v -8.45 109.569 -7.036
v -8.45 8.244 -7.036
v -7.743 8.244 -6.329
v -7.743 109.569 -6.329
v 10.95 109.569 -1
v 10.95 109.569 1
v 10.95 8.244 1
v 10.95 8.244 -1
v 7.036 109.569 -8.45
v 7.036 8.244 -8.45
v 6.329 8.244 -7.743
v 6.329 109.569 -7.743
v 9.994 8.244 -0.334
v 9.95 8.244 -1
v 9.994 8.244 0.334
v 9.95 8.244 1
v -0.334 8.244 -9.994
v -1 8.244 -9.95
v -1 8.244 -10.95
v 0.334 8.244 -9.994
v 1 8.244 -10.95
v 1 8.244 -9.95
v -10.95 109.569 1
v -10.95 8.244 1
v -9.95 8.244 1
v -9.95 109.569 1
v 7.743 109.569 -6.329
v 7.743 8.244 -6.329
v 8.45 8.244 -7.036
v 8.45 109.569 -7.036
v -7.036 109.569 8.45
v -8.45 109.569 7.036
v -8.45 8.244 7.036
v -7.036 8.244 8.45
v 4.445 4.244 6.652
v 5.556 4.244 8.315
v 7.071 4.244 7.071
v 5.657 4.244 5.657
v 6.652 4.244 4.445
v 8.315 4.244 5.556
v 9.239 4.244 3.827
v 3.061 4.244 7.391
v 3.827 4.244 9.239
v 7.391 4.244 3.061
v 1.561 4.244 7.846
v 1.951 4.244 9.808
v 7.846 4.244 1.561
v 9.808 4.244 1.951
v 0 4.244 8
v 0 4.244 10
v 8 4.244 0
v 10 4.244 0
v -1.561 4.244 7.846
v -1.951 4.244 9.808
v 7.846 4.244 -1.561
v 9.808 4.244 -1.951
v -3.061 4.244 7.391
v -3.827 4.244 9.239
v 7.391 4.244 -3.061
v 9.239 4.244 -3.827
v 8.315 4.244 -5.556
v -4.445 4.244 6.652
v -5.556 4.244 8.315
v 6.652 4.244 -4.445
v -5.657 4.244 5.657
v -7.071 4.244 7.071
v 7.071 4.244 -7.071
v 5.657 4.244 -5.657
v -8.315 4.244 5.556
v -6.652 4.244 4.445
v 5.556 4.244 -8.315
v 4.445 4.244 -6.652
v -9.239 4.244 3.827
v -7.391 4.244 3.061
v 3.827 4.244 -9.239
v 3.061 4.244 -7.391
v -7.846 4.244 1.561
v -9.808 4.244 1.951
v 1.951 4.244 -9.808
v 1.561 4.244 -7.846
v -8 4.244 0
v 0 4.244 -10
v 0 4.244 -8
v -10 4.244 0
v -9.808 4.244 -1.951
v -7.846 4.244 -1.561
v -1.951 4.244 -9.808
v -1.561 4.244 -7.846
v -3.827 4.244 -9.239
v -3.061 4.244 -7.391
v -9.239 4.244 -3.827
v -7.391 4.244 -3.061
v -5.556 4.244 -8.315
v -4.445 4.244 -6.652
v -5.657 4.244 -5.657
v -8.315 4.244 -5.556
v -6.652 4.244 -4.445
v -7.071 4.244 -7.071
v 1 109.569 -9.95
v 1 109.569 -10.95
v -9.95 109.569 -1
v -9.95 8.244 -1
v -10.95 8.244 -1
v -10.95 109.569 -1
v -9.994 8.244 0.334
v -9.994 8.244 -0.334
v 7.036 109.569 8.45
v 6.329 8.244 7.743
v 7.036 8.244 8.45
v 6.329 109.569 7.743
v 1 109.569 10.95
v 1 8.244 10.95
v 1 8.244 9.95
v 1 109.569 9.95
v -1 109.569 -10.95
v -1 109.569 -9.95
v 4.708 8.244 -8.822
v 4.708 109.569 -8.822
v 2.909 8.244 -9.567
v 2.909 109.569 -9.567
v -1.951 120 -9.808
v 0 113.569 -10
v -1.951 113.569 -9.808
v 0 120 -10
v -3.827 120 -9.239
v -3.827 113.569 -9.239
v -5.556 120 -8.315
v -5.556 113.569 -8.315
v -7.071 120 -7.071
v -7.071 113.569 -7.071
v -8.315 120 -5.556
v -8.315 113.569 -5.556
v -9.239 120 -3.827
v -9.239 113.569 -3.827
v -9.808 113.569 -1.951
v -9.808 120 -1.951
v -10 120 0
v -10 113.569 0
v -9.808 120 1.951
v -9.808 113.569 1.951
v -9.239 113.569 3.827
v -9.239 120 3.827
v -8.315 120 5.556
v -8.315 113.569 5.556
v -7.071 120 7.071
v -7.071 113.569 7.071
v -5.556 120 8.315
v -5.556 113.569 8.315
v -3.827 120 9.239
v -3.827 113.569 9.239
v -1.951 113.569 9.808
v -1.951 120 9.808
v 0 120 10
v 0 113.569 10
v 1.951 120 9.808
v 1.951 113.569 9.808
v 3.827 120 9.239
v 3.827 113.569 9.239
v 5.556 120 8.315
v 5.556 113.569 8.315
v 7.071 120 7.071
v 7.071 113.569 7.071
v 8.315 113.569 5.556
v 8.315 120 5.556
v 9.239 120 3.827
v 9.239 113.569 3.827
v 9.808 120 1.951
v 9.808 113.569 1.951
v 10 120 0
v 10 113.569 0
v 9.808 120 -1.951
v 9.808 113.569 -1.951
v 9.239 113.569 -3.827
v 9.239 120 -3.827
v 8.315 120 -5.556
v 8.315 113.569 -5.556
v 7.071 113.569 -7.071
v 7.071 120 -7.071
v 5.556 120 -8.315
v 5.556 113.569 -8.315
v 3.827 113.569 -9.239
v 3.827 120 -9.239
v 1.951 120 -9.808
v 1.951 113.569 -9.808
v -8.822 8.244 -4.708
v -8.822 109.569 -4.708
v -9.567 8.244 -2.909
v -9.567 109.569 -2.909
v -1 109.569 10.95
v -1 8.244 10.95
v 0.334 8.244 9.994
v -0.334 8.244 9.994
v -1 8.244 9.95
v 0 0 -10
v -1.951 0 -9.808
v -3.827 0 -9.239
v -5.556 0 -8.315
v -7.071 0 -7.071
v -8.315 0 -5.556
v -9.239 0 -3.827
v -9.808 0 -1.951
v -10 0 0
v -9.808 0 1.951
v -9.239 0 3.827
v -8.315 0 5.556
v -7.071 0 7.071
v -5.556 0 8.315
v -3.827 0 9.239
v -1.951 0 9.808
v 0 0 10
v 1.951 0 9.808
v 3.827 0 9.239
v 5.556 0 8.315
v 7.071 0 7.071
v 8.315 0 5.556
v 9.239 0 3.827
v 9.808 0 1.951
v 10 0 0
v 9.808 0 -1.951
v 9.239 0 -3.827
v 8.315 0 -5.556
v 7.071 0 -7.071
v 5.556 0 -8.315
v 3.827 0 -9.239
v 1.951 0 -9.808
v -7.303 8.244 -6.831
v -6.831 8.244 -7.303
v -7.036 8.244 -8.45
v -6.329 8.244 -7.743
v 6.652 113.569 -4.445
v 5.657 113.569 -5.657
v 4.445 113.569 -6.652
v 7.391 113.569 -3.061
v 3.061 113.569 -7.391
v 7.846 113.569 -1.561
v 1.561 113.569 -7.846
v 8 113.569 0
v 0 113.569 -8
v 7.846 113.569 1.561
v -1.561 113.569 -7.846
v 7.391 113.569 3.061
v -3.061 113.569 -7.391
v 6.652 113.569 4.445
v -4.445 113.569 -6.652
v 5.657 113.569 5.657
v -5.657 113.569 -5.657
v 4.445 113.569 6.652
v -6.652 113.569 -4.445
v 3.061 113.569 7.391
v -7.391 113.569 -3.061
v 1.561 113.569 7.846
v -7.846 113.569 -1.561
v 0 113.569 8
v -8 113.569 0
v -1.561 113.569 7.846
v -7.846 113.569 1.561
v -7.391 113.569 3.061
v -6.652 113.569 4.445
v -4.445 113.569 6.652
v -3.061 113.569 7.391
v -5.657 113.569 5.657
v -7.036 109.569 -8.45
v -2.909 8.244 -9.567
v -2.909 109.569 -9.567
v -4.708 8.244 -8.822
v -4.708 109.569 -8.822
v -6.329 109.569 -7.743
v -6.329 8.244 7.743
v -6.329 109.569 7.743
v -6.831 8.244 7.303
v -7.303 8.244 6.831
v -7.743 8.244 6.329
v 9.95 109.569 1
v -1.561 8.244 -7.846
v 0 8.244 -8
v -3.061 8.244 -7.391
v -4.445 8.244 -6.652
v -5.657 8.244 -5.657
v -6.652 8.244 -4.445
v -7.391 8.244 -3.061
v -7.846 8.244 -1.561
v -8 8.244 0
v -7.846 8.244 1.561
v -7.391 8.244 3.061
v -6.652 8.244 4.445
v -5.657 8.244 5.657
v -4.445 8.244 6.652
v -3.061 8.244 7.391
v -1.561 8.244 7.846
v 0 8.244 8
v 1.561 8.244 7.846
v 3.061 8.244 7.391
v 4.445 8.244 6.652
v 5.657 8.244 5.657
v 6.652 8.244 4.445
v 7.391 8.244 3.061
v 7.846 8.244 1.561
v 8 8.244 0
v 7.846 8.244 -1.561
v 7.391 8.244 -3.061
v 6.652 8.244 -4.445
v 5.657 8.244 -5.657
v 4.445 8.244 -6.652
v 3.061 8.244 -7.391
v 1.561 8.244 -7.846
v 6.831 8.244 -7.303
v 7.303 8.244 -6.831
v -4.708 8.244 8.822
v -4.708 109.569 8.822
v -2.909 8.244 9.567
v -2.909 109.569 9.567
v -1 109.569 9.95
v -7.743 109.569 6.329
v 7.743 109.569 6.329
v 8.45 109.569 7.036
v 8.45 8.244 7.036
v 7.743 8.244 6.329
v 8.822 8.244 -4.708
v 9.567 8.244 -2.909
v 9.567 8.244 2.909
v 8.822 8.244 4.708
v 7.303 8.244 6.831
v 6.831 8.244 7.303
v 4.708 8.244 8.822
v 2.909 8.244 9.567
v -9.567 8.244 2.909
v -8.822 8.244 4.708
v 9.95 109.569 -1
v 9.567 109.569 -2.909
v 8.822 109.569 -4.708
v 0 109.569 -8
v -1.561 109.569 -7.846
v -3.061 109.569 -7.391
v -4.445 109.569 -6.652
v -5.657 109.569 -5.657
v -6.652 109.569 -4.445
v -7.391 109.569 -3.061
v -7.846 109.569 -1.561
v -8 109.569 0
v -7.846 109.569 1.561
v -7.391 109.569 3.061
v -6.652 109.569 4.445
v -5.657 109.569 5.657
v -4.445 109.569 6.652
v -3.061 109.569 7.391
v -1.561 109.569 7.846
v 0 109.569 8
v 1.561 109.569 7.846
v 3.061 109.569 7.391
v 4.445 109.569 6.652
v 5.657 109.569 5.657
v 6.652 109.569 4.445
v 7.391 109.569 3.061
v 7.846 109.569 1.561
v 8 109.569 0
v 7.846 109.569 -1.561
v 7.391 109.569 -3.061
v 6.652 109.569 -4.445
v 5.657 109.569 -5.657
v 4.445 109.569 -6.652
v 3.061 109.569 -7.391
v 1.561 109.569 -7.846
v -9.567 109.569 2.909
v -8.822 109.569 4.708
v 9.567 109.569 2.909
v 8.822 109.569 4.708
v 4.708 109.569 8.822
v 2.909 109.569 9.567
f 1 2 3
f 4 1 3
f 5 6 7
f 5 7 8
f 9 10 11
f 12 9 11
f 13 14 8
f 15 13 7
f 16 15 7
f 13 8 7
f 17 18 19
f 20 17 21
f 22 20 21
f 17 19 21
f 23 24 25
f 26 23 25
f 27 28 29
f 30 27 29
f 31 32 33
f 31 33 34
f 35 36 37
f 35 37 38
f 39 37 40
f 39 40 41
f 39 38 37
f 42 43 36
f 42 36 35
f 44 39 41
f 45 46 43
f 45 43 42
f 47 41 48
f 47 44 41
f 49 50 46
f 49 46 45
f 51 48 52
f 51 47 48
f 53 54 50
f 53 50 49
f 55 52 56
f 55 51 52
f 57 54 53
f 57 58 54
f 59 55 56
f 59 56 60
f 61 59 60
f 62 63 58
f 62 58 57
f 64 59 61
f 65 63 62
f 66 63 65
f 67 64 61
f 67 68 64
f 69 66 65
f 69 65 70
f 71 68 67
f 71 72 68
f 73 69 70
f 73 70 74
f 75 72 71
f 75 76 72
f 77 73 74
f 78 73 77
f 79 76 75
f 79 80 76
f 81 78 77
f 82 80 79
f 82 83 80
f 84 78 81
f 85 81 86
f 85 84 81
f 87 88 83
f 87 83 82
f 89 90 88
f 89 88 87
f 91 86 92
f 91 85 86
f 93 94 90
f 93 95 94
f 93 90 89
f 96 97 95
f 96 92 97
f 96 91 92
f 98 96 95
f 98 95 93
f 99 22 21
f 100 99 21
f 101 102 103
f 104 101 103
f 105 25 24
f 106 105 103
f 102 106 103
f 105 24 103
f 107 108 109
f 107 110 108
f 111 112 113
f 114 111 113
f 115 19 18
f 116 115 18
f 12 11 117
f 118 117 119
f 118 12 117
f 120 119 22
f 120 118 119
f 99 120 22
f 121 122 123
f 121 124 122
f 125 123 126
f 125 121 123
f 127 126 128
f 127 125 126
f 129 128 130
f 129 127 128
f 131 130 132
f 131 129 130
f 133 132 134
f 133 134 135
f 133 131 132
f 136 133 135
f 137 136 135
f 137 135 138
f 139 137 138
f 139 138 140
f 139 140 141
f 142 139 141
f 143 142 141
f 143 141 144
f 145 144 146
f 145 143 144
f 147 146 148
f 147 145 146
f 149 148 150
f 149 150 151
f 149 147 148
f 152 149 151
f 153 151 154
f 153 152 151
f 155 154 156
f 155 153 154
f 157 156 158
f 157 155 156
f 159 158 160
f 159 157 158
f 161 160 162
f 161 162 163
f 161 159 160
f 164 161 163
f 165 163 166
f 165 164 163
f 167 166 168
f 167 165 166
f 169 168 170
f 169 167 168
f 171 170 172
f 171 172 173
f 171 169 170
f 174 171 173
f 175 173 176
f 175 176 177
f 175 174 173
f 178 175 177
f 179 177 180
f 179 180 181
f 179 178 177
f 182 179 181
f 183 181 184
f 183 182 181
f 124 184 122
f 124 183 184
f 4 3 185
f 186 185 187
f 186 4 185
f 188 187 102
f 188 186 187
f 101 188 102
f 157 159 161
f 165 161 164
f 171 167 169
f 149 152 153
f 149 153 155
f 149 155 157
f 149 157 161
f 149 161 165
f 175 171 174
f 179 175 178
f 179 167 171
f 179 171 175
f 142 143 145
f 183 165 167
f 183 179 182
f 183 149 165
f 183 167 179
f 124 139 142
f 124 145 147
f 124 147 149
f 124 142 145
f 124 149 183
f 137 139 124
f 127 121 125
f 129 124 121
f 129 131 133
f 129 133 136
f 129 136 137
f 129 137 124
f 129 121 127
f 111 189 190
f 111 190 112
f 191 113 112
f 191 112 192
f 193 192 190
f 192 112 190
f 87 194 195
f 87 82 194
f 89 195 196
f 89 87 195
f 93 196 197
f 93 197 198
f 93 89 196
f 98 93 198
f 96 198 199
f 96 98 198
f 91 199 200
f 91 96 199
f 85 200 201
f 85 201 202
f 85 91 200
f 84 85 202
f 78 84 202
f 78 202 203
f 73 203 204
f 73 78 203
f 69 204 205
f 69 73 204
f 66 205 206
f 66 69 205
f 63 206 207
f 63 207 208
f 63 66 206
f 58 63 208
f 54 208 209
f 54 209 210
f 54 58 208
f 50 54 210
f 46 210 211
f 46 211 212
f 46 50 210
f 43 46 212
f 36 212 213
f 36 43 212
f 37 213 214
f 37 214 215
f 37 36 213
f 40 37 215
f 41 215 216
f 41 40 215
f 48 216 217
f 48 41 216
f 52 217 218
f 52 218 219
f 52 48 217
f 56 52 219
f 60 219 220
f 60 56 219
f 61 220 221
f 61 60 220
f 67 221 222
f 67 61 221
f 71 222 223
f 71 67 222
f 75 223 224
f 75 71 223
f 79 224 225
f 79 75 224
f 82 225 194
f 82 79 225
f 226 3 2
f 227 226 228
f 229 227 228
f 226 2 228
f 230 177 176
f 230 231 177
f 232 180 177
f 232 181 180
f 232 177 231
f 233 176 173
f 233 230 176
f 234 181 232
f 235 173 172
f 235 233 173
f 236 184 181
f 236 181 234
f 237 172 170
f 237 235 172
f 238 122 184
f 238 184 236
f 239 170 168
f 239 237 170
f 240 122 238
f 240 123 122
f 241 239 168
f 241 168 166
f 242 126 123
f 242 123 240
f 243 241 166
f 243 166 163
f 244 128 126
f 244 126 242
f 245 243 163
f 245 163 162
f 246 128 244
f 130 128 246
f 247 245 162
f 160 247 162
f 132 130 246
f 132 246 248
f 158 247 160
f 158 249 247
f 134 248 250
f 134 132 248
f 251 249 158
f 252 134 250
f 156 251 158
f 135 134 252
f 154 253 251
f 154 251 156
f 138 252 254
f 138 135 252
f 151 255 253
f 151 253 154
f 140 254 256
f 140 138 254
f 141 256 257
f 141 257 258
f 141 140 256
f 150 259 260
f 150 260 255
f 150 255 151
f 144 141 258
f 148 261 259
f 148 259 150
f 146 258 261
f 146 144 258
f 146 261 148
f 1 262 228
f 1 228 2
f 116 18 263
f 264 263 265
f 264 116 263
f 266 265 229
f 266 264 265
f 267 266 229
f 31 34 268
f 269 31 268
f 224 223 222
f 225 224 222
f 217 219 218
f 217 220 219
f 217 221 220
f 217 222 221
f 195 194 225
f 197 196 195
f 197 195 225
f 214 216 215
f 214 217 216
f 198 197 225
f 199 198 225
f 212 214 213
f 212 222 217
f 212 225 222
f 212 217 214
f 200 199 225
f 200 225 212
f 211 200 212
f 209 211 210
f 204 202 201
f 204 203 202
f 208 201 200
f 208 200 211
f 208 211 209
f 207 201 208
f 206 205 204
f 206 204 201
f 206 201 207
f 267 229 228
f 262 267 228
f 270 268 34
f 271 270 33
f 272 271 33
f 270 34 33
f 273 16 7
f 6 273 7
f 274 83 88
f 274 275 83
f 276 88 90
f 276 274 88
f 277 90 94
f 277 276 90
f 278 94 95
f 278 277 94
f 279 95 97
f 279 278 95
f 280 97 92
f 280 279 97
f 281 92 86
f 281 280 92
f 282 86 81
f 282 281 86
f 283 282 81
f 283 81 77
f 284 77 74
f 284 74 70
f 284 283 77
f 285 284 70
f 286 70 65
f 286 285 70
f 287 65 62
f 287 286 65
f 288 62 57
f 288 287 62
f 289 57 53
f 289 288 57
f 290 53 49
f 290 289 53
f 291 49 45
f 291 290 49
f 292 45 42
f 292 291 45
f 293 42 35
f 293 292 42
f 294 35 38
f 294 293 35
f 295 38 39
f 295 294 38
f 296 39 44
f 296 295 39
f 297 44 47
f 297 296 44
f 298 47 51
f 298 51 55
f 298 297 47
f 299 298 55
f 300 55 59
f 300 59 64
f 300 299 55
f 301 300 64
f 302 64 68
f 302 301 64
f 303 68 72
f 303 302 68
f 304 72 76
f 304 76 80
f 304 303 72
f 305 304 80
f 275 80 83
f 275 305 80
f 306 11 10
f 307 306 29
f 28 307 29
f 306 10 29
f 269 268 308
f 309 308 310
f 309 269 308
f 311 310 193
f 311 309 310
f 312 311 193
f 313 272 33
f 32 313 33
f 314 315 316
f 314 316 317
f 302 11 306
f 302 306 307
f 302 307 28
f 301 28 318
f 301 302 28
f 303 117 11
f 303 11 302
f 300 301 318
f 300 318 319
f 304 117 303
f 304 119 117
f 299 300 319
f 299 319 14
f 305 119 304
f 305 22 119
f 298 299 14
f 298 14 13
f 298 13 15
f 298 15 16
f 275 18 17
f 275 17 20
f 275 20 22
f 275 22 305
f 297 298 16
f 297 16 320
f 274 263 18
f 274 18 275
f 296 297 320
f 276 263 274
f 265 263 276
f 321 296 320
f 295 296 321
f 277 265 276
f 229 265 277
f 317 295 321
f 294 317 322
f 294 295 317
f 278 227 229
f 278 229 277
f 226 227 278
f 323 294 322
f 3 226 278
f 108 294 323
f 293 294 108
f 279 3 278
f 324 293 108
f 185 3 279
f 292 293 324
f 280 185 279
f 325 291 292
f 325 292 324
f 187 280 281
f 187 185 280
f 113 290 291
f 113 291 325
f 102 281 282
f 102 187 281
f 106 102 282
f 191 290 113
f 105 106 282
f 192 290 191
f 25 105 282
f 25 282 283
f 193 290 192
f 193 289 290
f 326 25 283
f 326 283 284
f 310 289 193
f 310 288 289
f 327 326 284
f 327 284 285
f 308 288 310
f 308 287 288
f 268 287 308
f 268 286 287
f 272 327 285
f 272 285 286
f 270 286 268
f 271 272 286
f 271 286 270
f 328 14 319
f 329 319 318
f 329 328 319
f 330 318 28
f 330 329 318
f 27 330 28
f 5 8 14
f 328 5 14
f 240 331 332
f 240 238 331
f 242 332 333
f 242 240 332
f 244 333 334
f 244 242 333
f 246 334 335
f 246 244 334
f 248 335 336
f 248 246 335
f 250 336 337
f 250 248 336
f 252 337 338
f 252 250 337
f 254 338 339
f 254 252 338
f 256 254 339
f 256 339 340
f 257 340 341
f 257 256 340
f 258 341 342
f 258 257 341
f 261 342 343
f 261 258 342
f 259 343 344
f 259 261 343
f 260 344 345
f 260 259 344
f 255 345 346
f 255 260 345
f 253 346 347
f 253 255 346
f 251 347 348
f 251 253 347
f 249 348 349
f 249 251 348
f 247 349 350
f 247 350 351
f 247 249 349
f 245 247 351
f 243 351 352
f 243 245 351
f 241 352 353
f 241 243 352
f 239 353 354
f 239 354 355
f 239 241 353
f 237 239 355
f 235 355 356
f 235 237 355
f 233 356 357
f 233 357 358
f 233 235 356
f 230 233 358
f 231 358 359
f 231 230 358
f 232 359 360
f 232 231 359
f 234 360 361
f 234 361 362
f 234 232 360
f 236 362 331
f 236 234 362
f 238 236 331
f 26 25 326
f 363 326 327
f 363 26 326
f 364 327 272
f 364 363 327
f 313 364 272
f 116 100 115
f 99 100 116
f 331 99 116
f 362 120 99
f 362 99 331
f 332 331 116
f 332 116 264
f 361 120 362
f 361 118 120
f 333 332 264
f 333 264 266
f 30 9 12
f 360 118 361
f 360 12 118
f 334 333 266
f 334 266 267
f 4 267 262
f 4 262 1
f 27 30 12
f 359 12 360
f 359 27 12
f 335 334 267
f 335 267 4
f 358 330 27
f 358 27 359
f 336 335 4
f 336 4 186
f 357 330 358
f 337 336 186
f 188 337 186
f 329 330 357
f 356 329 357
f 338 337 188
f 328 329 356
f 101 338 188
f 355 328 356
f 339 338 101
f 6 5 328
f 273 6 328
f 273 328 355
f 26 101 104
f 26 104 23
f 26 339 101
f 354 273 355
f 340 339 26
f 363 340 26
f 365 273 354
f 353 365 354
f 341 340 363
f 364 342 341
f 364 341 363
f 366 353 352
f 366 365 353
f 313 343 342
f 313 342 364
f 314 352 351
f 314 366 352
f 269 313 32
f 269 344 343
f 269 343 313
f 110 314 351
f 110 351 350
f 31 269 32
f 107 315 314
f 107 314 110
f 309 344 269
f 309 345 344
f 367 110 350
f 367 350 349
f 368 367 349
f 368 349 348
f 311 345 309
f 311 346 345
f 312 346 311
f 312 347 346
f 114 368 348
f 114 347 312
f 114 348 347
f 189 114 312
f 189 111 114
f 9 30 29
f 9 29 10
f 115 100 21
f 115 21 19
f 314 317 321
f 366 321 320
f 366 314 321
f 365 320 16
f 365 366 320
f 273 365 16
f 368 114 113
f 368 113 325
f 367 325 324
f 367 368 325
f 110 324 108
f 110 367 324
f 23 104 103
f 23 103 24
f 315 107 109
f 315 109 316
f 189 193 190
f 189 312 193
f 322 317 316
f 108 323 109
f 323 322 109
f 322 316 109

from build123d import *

# Parameters (mm, degrees)
BOSS_EXTRUDE2_START = -109.568605
BOSS_EXTRUDE2_DEPTH = 101.325087
CIRPATTERN1_COUNT   = 8


with BuildPart() as part:
    # Sketch3 → Revolve1 (revolve)
    with BuildSketch(Plane(origin=(0, 0, 0), x_dir=(0, 0, -1), z_dir=(1, 0, 0))):
        Polygon((0, 120), (0, 0), (10, 0), (10, 4.243518426), (8, 4.243518426), (8, 8.243518426), (10, 8.243518426), (10, 109.568605079), (8, 109.568605079), (8, 113.568605079), (10, 113.568605079), (10, 120), align=None)
    revolve(axis=Axis((0, 0, 0), (0, 1, 0)))

    # Sketch4 → Boss-Extrude2 (add)
    with BuildSketch(Plane.XZ.offset(BOSS_EXTRUDE2_START)):
        with BuildLine():
            Line((-1, 9.949874371), (-1, 10.949874371))
            Line((-1, 10.949874371), (1, 10.949874371))
            Line((1, 10.949874371), (1, 9.949874371))
            ThreePointArc((1, 9.949874371), (0, 10), (-1, 9.949874371))
        make_face()
    boss_extrude2 = extrude(amount=BOSS_EXTRUDE2_DEPTH)

    # CirPattern1: Boss-Extrude2 ×8 about axis
    cirpattern1_axis = Axis((0, 0, 0), (0, 1, 0))
    for i in range(1, CIRPATTERN1_COUNT):
        add(boss_extrude2.rotate(cirpattern1_axis, i * 360 / CIRPATTERN1_COUNT))


solid = part.part
